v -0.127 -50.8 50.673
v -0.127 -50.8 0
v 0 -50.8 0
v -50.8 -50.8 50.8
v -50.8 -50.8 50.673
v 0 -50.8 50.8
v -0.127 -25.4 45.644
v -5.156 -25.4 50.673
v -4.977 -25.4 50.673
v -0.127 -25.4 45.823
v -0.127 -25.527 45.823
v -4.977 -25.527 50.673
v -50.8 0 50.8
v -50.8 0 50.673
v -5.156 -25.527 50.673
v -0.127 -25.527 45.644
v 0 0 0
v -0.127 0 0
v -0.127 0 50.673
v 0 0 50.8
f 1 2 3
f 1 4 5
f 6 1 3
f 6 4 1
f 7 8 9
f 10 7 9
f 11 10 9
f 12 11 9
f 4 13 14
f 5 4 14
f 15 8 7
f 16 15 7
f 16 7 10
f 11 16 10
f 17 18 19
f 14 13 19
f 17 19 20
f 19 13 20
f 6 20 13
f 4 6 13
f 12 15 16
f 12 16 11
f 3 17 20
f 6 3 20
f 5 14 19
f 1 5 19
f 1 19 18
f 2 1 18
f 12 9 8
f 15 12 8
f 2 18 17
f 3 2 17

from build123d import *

# Parameters (mm, degrees)
F1_DEPTH = 25.4
F3_DEPTH = 0.127
F4_DEPTH = 50.8


with BuildPart() as f1:
    # F0 (on Front) → F1 (new body)
    with BuildSketch(Plane.XZ):
        Polygon((-0.127, 0), (0, 0), (0, 50.8), (-50.8, 50.8), (-50.8, 50.673), (-0.127, 50.673), align=None)
    extrude(amount=F1_DEPTH)

    # F0 (on Front) → F4 (join)
    with BuildSketch(Plane.XZ):
        Polygon((-0.127, 0), (0, 0), (0, 50.8), (-50.8, 50.8), (-50.8, 50.673), (-0.127, 50.673), align=None)
    extrude(amount=F4_DEPTH)


with BuildPart() as f3:
    # F2 (on face) → F3 (new body)
    with BuildSketch(Plane.XZ.offset(25.4)):
        Polygon((-4.9765948776, 50.673), (-5.1562, 50.673), (-0.127, 45.6438), (-0.127, 45.8234051224), align=None)
    extrude(amount=F3_DEPTH)


solid = Compound([f1.part, f3.part])
